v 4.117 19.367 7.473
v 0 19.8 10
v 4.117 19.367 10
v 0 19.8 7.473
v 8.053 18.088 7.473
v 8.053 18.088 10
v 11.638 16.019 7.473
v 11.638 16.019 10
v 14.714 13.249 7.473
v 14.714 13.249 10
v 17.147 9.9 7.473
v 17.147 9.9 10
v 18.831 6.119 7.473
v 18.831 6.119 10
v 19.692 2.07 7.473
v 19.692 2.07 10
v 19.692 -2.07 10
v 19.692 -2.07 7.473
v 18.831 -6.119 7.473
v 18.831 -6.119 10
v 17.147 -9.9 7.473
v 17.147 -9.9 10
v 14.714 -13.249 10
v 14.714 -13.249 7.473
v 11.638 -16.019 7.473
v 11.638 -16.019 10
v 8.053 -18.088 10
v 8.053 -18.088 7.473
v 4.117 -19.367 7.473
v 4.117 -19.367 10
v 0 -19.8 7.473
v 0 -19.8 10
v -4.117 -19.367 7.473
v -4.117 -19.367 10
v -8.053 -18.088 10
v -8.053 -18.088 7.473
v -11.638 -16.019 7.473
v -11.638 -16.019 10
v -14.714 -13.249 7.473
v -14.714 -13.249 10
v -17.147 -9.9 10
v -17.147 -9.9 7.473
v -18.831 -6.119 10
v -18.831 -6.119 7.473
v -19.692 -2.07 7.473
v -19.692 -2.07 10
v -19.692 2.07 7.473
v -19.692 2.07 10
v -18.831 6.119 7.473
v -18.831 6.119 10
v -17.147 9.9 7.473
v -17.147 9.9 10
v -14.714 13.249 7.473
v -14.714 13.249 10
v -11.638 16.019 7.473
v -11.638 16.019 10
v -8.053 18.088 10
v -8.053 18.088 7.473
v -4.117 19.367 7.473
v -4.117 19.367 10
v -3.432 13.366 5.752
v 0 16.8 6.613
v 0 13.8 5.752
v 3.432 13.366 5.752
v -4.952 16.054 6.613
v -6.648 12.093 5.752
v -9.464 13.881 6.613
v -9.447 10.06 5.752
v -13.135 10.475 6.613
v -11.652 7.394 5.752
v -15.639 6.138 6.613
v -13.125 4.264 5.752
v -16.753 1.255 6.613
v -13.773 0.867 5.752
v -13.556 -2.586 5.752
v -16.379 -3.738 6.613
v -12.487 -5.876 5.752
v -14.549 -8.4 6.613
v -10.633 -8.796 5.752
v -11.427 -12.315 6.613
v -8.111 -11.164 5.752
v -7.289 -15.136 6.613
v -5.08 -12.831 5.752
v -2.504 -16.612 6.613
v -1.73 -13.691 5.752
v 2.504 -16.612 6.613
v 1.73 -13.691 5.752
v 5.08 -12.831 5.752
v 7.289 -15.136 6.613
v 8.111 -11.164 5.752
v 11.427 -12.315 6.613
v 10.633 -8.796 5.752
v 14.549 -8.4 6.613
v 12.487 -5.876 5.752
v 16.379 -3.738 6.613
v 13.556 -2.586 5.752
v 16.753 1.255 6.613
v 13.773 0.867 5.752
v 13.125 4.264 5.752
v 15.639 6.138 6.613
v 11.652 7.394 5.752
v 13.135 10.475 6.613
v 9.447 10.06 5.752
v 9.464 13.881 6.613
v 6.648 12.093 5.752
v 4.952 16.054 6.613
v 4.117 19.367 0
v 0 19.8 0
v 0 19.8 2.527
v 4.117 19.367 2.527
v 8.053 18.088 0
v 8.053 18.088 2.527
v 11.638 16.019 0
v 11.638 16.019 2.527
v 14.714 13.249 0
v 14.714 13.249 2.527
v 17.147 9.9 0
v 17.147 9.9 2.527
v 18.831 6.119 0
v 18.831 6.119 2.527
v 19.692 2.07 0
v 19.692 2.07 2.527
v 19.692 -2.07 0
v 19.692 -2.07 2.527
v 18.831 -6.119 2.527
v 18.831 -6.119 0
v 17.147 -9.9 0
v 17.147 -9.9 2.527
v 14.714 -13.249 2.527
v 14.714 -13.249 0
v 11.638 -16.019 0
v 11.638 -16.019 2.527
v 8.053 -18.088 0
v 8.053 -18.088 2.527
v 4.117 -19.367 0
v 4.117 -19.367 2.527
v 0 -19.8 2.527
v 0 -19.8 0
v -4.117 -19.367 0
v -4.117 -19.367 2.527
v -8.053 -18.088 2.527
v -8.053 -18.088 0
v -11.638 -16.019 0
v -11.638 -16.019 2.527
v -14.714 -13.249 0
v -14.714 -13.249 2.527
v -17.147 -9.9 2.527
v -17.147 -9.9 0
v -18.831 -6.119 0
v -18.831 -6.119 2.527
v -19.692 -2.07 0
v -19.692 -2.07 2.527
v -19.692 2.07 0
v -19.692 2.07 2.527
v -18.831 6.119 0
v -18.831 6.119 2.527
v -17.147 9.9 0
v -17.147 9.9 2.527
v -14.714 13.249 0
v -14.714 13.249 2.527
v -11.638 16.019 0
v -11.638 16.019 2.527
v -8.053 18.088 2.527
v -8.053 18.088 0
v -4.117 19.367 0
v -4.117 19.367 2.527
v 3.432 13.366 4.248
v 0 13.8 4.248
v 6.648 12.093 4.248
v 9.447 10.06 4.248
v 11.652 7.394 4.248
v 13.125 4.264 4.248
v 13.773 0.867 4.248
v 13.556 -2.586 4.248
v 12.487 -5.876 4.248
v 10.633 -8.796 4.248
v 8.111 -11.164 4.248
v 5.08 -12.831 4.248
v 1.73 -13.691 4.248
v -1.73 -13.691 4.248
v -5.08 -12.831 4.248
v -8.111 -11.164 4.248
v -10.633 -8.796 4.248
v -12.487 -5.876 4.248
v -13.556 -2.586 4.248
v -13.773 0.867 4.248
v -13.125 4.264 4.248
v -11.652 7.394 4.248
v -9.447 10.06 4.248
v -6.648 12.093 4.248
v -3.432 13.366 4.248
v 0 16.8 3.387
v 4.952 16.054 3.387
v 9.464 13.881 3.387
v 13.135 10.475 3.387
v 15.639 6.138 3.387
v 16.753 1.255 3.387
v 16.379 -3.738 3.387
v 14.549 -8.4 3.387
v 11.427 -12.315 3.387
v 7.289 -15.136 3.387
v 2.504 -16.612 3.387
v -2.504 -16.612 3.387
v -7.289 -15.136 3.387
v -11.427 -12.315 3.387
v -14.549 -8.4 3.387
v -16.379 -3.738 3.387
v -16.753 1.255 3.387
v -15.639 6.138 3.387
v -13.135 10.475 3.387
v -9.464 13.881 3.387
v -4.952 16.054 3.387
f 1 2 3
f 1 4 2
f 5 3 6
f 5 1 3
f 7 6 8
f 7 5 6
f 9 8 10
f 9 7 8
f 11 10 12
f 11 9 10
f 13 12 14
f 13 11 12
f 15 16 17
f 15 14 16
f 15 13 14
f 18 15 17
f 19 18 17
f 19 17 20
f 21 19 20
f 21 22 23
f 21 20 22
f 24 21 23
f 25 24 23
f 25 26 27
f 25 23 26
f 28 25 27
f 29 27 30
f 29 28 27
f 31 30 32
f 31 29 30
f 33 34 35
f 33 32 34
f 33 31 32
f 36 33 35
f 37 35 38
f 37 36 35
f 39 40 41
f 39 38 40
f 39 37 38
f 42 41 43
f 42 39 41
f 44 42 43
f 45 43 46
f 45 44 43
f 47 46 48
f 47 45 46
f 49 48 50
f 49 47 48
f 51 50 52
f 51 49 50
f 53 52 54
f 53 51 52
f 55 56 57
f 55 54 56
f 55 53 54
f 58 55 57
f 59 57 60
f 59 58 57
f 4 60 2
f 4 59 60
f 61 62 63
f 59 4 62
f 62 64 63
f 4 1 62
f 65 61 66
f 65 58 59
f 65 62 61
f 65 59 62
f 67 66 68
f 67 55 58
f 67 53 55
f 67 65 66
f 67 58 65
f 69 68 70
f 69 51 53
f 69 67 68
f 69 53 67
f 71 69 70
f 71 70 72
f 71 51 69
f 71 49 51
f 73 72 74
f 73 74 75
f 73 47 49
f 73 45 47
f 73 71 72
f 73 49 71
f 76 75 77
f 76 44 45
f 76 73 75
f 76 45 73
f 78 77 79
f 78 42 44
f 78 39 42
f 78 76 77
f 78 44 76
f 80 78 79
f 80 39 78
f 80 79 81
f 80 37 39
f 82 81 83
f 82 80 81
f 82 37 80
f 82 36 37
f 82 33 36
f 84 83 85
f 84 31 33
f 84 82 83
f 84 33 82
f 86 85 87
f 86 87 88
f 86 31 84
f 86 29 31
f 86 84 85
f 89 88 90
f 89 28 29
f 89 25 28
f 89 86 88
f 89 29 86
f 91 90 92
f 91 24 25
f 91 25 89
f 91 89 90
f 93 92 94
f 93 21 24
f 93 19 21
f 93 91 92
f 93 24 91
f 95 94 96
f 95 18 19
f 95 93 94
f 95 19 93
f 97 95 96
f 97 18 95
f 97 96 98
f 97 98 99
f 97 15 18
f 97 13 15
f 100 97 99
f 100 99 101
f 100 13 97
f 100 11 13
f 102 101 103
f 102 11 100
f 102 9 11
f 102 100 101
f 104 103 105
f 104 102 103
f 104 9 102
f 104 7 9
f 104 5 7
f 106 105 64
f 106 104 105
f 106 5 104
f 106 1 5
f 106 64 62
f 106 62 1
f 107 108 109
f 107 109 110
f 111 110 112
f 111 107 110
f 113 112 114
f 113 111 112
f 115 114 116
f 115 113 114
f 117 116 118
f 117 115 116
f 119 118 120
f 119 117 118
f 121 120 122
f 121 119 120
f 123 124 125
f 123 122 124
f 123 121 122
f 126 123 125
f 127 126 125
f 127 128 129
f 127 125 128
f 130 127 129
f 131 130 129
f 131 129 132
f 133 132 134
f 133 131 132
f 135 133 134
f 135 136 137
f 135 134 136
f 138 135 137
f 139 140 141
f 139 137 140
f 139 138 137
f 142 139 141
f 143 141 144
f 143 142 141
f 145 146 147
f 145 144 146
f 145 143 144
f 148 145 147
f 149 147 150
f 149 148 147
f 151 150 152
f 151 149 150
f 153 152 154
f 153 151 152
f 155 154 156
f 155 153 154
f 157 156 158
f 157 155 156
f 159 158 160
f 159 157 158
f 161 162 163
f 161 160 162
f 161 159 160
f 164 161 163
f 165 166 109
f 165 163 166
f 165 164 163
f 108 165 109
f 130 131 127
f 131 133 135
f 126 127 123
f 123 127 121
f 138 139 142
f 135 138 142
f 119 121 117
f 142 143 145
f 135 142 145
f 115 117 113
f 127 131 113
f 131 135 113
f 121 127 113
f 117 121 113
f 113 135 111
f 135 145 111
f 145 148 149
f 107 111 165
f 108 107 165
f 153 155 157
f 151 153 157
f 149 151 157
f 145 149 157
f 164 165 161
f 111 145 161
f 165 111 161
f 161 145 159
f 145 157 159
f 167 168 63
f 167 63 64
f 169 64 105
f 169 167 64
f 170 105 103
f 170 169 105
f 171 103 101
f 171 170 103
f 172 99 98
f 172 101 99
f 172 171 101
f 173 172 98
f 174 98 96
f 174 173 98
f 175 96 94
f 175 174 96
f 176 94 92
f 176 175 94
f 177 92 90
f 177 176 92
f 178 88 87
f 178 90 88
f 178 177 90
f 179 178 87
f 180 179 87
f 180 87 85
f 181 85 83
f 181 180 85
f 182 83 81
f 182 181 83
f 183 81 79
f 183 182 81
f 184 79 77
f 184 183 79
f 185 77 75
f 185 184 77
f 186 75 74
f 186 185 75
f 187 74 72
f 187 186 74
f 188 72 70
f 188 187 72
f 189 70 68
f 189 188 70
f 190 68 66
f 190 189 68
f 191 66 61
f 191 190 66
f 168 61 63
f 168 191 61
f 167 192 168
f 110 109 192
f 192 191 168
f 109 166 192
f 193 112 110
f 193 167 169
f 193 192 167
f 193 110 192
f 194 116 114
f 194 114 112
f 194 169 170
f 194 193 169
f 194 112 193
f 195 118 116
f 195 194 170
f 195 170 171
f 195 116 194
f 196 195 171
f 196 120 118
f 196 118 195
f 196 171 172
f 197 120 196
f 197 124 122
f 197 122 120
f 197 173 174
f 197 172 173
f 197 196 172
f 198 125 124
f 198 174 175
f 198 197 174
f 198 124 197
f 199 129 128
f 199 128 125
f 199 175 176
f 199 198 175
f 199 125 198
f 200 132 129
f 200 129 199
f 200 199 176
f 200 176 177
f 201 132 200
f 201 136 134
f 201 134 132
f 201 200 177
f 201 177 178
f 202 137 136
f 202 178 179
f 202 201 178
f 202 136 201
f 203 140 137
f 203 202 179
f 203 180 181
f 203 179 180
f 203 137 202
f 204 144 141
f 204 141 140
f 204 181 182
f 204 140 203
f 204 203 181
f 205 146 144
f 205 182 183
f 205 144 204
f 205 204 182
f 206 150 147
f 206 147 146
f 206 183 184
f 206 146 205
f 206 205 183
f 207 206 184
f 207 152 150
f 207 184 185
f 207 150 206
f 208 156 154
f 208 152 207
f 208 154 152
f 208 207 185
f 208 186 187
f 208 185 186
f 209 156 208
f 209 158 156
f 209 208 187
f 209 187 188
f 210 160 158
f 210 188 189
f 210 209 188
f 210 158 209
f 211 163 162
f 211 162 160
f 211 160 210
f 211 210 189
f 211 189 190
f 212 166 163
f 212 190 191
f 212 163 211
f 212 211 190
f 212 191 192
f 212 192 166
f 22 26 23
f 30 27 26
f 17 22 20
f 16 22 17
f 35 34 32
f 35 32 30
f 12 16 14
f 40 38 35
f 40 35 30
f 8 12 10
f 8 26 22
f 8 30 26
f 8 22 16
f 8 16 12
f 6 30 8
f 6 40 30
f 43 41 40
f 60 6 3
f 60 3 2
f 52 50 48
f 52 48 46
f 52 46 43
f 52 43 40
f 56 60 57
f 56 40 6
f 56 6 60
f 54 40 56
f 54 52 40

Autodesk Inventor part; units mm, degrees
ref_plane "YZ Plane" through (0, 0, 0) normal (1, 0, 0) x (0, 1, 0)
ref_plane "XZ Plane" through (0, 0, 0) normal (0, 1, 0) x (-1, 0, 0)
sketch "Основной эскиз" plane through (0, 0, 0) normal (1, 0, 0) x (0, 1, 0)
  line L0 (0, 10) -> (19.8, 10)
  line L1 (19.8, 10) -> (19.8, 7.4728)
  line L2 (19.8, 7.4728) -> (13.8, 5.7523)
  line L3 (13.8, 5.7523) -> (13.8, 4.2477)
  line L4 (13.8, 4.2477) -> (19.8, 2.5272)
  line L5 (19.8, 2.5272) -> (19.8, 0)
  line L6 (19.8, 0) -> (0, 0)
  line L7 (18.5, 7.1) -> (18.5, 2.9) construction
  line L8 (13.8, 5) -> (18.5, 5) construction
  line L9 (19.8, 7.4728) -> (19.8, 2.5272)
  line L10 (0, -2) -> (0, 12) projected
  line L11 (0, 0) -> (0, 10)
  dimension "d0" = 4.2
  dimension "d1" = 32
  dimension "d2" = 1.3
  dimension "d6" = 10
  dimension "d21" = 37
  dimension "d25" = 6
  dimension "d27" = 5
ref_plane "Плоскость ремня" through (0, 13.8, 5) normal (0, 0, 1) x (1, 0, 0)
revolve "Тело" add sketch "Основной эскиз" angle 360 about axis through (0, 0, -10) along (0, 0, 1)
revolve "Канавка" cut sketch "Основной эскиз" angle 360 about axis through (0, 0, -10) along (0, 0, 1) contours L9 L4 L3 L2
fillet "Сопряжение снаружи" [suppressed]
fillet "Сопряжение изнутри" [suppressed]
pattern_of_one "Образец канавки"
equation "\"d0\" = da_Bw"
equation "\"d1\" = da_Alfa"
equation "\"d2\" = da_c"
equation "\"d21\" = da_Dw"
equation "\"d25\" = da_Hd"
equation "\"d27\" = da_Se"
equation "\"da_r1\" = 0"
equation "\"da_r2\" = 0"
equation "\"d18\" = da_Sg"
equation "\"d5\" = da_Se"
equation "\"da_Bw\" = 4.2"
equation "\"da_Alfa\" = 32deg"
equation "\"da_c\" = 1.3"
equation "\"da_Dw\" = 37"
equation "\"da_Hd\" = 6"
equation "\"da_Se\" = 5"
equation "\"da_Sg\" = 6"
properties part number "Шкив желобчатый2" material "Steel"
